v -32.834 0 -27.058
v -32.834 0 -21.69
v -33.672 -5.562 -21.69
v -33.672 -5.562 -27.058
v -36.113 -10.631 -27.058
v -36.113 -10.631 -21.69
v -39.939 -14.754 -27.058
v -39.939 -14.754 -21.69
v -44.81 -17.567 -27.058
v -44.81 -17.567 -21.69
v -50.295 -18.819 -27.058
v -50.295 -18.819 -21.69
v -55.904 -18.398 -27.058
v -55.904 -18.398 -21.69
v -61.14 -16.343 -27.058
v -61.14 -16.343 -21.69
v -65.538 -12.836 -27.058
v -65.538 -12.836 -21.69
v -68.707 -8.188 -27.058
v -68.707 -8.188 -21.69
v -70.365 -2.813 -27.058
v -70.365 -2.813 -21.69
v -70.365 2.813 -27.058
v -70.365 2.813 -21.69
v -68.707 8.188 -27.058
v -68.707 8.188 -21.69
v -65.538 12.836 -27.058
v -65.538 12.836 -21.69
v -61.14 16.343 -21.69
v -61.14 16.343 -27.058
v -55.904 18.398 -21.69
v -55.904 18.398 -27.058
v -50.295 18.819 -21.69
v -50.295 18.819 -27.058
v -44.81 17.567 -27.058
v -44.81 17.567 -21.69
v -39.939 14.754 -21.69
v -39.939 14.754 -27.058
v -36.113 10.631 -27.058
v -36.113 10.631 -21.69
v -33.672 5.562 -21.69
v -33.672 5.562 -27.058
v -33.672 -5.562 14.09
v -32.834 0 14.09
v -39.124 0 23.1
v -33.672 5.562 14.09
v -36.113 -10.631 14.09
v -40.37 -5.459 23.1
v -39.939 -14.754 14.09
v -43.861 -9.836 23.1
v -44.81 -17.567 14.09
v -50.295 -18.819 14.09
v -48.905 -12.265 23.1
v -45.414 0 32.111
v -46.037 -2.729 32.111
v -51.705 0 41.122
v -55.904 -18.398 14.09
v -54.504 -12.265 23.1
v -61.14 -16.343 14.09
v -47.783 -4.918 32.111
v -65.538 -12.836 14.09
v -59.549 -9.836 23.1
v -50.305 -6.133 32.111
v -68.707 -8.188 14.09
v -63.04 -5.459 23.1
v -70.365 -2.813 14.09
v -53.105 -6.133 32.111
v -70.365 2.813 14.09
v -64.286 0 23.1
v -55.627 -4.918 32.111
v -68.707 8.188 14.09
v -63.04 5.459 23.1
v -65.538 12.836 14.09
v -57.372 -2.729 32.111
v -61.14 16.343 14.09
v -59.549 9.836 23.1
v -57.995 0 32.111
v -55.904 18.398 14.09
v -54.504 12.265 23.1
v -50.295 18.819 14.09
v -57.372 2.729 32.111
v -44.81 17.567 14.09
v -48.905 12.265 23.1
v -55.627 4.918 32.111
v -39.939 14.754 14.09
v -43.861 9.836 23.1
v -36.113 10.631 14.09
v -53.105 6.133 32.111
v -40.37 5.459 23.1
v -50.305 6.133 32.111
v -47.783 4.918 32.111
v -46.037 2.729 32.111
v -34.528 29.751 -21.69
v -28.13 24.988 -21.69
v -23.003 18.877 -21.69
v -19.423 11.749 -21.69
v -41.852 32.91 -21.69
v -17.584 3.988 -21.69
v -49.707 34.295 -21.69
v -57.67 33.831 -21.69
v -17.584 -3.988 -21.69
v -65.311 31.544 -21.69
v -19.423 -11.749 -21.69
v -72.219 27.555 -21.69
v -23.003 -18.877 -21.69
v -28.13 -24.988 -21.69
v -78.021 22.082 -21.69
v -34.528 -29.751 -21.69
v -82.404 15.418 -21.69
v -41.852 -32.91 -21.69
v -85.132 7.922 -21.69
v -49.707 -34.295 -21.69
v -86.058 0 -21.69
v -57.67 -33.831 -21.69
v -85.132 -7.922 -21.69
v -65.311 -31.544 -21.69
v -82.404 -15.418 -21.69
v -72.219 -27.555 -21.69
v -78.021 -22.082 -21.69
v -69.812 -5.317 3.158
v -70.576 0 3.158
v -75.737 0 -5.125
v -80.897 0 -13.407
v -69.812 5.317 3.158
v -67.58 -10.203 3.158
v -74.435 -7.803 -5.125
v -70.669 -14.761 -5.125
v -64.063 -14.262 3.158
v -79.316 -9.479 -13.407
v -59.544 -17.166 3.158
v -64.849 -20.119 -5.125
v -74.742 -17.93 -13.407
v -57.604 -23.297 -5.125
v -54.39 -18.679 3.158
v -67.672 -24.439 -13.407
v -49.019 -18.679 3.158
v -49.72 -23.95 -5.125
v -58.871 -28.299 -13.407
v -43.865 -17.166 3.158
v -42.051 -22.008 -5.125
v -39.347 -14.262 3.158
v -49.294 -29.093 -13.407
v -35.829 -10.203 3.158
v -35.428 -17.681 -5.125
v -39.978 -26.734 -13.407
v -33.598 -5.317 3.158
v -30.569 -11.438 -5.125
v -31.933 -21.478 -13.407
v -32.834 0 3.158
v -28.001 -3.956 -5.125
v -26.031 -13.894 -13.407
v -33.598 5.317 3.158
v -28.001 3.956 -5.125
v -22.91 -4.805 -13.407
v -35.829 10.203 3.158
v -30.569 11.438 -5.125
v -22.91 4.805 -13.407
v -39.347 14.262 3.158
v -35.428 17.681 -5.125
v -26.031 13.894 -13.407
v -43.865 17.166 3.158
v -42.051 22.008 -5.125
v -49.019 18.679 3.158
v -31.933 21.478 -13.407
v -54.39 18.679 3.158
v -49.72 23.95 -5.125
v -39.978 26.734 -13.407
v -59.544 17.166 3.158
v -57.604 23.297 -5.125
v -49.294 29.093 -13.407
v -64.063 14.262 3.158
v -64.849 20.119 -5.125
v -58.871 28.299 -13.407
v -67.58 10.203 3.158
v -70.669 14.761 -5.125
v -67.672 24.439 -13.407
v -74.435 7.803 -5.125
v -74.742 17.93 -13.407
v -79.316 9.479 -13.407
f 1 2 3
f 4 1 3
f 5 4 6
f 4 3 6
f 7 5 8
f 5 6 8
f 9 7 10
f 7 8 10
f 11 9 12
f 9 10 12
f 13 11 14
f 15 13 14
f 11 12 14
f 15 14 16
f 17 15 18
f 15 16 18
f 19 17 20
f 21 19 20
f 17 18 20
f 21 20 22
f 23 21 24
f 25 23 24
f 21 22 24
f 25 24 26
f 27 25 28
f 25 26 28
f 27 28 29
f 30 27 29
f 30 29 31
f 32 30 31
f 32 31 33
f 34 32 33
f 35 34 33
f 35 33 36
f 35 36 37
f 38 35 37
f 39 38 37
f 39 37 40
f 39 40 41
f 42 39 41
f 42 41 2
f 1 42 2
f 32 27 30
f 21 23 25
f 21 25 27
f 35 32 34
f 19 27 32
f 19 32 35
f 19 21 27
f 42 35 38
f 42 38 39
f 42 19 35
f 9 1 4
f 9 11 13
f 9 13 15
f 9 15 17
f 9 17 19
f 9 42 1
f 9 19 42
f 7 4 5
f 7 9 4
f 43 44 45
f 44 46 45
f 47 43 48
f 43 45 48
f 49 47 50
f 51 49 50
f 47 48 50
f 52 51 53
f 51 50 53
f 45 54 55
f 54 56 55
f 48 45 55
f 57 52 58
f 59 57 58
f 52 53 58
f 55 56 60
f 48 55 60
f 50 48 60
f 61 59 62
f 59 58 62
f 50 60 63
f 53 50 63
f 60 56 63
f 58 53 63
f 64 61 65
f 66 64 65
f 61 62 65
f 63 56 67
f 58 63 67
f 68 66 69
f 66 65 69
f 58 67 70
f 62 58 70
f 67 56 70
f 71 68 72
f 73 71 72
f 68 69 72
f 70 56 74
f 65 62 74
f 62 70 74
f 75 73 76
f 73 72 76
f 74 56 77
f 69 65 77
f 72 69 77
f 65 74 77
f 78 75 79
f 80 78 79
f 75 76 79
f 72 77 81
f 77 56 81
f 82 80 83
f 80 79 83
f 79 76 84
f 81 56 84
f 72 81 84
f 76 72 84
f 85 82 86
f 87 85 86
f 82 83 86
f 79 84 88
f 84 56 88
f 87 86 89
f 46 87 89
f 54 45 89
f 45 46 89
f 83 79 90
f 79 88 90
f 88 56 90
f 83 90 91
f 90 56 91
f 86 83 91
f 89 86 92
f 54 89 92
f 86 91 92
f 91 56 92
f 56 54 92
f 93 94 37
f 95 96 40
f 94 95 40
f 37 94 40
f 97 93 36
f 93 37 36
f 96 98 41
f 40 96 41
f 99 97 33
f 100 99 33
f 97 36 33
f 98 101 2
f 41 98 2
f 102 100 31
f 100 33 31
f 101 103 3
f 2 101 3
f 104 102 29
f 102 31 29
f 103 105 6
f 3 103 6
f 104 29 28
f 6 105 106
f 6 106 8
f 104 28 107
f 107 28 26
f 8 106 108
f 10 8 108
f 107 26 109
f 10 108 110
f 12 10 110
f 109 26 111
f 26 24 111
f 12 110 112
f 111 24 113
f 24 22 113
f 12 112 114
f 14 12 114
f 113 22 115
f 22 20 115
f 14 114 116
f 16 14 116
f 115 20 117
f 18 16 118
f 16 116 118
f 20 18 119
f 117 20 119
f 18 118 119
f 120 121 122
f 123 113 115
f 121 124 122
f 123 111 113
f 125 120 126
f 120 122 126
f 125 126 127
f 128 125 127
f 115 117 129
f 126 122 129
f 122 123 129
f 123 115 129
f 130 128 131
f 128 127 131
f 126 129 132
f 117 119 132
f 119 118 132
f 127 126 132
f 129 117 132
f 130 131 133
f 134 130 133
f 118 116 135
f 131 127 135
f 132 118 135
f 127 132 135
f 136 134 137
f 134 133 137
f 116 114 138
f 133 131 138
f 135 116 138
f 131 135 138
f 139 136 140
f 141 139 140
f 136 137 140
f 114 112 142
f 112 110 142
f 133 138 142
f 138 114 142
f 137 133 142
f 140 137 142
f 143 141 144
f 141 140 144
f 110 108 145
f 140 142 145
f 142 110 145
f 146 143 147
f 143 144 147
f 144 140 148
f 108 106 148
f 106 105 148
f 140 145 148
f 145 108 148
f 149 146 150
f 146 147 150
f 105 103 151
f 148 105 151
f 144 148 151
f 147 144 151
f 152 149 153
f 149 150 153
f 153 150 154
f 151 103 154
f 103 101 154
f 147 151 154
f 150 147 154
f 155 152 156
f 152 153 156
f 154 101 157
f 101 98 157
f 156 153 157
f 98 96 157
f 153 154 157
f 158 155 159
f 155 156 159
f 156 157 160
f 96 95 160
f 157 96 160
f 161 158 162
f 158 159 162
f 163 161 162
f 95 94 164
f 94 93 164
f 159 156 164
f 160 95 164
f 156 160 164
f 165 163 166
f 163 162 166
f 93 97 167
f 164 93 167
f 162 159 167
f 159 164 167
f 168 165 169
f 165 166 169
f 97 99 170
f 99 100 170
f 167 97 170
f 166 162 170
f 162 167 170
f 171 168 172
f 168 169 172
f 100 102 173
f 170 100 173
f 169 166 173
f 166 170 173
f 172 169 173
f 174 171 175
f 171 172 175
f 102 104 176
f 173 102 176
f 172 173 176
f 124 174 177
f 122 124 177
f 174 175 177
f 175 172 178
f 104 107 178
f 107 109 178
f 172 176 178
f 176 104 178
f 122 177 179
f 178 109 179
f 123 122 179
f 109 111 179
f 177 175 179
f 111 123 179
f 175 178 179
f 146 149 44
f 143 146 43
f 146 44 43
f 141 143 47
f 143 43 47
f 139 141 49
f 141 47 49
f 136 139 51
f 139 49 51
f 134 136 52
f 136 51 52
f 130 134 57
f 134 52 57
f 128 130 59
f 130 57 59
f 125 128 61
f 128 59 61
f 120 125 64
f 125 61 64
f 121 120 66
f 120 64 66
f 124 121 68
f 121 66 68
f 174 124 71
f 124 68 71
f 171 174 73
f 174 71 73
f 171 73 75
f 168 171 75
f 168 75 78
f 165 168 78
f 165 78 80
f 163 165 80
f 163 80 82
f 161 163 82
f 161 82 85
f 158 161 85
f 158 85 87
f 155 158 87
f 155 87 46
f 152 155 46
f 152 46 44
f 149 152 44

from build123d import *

# Parameters (mm, degrees)
F3_R     = 18.8713
F4_DEPTH = 41.148


with BuildPart() as f2:
    # F0 (on Front) → F2 (revolve)
    with BuildSketch(Plane.XZ):
        Polygon((-32.833509, 14.089718), (-51.704809, 41.12158), (-51.704809, 14.089718), align=None)
    revolve(axis=Axis((-51.704809, 0, 27.223122), (0, 0, -1)))

    # F3 (on face) → F4 (join)
    with BuildSketch(Plane(origin=(0, 0, 14.089718), x_dir=(1, 0, 0), z_dir=(0, 0, -1))):
        with Locations((-51.704809, 0)):
            Circle(F3_R)
    extrude(amount=F4_DEPTH)

    # F5 (on Front) → F6 (revolve)
    with BuildSketch(Plane.XZ):
        Polygon((-67.939401, -21.689953), (-67.712404, 7.753583), (-86.05796, -21.689953), align=None)
    revolve(axis=Axis((-51.704809, 0, 12.922877), (0, 0, 1)))


solid = f2.part
